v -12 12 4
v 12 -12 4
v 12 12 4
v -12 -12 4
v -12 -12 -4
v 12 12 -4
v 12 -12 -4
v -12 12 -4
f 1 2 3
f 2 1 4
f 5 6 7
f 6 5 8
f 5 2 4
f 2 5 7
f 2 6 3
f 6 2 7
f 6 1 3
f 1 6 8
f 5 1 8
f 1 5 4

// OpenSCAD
size = 32;//block=32 //item=8



cube([size * 0.75, size * 0.75, size * 0.25], center = true);
